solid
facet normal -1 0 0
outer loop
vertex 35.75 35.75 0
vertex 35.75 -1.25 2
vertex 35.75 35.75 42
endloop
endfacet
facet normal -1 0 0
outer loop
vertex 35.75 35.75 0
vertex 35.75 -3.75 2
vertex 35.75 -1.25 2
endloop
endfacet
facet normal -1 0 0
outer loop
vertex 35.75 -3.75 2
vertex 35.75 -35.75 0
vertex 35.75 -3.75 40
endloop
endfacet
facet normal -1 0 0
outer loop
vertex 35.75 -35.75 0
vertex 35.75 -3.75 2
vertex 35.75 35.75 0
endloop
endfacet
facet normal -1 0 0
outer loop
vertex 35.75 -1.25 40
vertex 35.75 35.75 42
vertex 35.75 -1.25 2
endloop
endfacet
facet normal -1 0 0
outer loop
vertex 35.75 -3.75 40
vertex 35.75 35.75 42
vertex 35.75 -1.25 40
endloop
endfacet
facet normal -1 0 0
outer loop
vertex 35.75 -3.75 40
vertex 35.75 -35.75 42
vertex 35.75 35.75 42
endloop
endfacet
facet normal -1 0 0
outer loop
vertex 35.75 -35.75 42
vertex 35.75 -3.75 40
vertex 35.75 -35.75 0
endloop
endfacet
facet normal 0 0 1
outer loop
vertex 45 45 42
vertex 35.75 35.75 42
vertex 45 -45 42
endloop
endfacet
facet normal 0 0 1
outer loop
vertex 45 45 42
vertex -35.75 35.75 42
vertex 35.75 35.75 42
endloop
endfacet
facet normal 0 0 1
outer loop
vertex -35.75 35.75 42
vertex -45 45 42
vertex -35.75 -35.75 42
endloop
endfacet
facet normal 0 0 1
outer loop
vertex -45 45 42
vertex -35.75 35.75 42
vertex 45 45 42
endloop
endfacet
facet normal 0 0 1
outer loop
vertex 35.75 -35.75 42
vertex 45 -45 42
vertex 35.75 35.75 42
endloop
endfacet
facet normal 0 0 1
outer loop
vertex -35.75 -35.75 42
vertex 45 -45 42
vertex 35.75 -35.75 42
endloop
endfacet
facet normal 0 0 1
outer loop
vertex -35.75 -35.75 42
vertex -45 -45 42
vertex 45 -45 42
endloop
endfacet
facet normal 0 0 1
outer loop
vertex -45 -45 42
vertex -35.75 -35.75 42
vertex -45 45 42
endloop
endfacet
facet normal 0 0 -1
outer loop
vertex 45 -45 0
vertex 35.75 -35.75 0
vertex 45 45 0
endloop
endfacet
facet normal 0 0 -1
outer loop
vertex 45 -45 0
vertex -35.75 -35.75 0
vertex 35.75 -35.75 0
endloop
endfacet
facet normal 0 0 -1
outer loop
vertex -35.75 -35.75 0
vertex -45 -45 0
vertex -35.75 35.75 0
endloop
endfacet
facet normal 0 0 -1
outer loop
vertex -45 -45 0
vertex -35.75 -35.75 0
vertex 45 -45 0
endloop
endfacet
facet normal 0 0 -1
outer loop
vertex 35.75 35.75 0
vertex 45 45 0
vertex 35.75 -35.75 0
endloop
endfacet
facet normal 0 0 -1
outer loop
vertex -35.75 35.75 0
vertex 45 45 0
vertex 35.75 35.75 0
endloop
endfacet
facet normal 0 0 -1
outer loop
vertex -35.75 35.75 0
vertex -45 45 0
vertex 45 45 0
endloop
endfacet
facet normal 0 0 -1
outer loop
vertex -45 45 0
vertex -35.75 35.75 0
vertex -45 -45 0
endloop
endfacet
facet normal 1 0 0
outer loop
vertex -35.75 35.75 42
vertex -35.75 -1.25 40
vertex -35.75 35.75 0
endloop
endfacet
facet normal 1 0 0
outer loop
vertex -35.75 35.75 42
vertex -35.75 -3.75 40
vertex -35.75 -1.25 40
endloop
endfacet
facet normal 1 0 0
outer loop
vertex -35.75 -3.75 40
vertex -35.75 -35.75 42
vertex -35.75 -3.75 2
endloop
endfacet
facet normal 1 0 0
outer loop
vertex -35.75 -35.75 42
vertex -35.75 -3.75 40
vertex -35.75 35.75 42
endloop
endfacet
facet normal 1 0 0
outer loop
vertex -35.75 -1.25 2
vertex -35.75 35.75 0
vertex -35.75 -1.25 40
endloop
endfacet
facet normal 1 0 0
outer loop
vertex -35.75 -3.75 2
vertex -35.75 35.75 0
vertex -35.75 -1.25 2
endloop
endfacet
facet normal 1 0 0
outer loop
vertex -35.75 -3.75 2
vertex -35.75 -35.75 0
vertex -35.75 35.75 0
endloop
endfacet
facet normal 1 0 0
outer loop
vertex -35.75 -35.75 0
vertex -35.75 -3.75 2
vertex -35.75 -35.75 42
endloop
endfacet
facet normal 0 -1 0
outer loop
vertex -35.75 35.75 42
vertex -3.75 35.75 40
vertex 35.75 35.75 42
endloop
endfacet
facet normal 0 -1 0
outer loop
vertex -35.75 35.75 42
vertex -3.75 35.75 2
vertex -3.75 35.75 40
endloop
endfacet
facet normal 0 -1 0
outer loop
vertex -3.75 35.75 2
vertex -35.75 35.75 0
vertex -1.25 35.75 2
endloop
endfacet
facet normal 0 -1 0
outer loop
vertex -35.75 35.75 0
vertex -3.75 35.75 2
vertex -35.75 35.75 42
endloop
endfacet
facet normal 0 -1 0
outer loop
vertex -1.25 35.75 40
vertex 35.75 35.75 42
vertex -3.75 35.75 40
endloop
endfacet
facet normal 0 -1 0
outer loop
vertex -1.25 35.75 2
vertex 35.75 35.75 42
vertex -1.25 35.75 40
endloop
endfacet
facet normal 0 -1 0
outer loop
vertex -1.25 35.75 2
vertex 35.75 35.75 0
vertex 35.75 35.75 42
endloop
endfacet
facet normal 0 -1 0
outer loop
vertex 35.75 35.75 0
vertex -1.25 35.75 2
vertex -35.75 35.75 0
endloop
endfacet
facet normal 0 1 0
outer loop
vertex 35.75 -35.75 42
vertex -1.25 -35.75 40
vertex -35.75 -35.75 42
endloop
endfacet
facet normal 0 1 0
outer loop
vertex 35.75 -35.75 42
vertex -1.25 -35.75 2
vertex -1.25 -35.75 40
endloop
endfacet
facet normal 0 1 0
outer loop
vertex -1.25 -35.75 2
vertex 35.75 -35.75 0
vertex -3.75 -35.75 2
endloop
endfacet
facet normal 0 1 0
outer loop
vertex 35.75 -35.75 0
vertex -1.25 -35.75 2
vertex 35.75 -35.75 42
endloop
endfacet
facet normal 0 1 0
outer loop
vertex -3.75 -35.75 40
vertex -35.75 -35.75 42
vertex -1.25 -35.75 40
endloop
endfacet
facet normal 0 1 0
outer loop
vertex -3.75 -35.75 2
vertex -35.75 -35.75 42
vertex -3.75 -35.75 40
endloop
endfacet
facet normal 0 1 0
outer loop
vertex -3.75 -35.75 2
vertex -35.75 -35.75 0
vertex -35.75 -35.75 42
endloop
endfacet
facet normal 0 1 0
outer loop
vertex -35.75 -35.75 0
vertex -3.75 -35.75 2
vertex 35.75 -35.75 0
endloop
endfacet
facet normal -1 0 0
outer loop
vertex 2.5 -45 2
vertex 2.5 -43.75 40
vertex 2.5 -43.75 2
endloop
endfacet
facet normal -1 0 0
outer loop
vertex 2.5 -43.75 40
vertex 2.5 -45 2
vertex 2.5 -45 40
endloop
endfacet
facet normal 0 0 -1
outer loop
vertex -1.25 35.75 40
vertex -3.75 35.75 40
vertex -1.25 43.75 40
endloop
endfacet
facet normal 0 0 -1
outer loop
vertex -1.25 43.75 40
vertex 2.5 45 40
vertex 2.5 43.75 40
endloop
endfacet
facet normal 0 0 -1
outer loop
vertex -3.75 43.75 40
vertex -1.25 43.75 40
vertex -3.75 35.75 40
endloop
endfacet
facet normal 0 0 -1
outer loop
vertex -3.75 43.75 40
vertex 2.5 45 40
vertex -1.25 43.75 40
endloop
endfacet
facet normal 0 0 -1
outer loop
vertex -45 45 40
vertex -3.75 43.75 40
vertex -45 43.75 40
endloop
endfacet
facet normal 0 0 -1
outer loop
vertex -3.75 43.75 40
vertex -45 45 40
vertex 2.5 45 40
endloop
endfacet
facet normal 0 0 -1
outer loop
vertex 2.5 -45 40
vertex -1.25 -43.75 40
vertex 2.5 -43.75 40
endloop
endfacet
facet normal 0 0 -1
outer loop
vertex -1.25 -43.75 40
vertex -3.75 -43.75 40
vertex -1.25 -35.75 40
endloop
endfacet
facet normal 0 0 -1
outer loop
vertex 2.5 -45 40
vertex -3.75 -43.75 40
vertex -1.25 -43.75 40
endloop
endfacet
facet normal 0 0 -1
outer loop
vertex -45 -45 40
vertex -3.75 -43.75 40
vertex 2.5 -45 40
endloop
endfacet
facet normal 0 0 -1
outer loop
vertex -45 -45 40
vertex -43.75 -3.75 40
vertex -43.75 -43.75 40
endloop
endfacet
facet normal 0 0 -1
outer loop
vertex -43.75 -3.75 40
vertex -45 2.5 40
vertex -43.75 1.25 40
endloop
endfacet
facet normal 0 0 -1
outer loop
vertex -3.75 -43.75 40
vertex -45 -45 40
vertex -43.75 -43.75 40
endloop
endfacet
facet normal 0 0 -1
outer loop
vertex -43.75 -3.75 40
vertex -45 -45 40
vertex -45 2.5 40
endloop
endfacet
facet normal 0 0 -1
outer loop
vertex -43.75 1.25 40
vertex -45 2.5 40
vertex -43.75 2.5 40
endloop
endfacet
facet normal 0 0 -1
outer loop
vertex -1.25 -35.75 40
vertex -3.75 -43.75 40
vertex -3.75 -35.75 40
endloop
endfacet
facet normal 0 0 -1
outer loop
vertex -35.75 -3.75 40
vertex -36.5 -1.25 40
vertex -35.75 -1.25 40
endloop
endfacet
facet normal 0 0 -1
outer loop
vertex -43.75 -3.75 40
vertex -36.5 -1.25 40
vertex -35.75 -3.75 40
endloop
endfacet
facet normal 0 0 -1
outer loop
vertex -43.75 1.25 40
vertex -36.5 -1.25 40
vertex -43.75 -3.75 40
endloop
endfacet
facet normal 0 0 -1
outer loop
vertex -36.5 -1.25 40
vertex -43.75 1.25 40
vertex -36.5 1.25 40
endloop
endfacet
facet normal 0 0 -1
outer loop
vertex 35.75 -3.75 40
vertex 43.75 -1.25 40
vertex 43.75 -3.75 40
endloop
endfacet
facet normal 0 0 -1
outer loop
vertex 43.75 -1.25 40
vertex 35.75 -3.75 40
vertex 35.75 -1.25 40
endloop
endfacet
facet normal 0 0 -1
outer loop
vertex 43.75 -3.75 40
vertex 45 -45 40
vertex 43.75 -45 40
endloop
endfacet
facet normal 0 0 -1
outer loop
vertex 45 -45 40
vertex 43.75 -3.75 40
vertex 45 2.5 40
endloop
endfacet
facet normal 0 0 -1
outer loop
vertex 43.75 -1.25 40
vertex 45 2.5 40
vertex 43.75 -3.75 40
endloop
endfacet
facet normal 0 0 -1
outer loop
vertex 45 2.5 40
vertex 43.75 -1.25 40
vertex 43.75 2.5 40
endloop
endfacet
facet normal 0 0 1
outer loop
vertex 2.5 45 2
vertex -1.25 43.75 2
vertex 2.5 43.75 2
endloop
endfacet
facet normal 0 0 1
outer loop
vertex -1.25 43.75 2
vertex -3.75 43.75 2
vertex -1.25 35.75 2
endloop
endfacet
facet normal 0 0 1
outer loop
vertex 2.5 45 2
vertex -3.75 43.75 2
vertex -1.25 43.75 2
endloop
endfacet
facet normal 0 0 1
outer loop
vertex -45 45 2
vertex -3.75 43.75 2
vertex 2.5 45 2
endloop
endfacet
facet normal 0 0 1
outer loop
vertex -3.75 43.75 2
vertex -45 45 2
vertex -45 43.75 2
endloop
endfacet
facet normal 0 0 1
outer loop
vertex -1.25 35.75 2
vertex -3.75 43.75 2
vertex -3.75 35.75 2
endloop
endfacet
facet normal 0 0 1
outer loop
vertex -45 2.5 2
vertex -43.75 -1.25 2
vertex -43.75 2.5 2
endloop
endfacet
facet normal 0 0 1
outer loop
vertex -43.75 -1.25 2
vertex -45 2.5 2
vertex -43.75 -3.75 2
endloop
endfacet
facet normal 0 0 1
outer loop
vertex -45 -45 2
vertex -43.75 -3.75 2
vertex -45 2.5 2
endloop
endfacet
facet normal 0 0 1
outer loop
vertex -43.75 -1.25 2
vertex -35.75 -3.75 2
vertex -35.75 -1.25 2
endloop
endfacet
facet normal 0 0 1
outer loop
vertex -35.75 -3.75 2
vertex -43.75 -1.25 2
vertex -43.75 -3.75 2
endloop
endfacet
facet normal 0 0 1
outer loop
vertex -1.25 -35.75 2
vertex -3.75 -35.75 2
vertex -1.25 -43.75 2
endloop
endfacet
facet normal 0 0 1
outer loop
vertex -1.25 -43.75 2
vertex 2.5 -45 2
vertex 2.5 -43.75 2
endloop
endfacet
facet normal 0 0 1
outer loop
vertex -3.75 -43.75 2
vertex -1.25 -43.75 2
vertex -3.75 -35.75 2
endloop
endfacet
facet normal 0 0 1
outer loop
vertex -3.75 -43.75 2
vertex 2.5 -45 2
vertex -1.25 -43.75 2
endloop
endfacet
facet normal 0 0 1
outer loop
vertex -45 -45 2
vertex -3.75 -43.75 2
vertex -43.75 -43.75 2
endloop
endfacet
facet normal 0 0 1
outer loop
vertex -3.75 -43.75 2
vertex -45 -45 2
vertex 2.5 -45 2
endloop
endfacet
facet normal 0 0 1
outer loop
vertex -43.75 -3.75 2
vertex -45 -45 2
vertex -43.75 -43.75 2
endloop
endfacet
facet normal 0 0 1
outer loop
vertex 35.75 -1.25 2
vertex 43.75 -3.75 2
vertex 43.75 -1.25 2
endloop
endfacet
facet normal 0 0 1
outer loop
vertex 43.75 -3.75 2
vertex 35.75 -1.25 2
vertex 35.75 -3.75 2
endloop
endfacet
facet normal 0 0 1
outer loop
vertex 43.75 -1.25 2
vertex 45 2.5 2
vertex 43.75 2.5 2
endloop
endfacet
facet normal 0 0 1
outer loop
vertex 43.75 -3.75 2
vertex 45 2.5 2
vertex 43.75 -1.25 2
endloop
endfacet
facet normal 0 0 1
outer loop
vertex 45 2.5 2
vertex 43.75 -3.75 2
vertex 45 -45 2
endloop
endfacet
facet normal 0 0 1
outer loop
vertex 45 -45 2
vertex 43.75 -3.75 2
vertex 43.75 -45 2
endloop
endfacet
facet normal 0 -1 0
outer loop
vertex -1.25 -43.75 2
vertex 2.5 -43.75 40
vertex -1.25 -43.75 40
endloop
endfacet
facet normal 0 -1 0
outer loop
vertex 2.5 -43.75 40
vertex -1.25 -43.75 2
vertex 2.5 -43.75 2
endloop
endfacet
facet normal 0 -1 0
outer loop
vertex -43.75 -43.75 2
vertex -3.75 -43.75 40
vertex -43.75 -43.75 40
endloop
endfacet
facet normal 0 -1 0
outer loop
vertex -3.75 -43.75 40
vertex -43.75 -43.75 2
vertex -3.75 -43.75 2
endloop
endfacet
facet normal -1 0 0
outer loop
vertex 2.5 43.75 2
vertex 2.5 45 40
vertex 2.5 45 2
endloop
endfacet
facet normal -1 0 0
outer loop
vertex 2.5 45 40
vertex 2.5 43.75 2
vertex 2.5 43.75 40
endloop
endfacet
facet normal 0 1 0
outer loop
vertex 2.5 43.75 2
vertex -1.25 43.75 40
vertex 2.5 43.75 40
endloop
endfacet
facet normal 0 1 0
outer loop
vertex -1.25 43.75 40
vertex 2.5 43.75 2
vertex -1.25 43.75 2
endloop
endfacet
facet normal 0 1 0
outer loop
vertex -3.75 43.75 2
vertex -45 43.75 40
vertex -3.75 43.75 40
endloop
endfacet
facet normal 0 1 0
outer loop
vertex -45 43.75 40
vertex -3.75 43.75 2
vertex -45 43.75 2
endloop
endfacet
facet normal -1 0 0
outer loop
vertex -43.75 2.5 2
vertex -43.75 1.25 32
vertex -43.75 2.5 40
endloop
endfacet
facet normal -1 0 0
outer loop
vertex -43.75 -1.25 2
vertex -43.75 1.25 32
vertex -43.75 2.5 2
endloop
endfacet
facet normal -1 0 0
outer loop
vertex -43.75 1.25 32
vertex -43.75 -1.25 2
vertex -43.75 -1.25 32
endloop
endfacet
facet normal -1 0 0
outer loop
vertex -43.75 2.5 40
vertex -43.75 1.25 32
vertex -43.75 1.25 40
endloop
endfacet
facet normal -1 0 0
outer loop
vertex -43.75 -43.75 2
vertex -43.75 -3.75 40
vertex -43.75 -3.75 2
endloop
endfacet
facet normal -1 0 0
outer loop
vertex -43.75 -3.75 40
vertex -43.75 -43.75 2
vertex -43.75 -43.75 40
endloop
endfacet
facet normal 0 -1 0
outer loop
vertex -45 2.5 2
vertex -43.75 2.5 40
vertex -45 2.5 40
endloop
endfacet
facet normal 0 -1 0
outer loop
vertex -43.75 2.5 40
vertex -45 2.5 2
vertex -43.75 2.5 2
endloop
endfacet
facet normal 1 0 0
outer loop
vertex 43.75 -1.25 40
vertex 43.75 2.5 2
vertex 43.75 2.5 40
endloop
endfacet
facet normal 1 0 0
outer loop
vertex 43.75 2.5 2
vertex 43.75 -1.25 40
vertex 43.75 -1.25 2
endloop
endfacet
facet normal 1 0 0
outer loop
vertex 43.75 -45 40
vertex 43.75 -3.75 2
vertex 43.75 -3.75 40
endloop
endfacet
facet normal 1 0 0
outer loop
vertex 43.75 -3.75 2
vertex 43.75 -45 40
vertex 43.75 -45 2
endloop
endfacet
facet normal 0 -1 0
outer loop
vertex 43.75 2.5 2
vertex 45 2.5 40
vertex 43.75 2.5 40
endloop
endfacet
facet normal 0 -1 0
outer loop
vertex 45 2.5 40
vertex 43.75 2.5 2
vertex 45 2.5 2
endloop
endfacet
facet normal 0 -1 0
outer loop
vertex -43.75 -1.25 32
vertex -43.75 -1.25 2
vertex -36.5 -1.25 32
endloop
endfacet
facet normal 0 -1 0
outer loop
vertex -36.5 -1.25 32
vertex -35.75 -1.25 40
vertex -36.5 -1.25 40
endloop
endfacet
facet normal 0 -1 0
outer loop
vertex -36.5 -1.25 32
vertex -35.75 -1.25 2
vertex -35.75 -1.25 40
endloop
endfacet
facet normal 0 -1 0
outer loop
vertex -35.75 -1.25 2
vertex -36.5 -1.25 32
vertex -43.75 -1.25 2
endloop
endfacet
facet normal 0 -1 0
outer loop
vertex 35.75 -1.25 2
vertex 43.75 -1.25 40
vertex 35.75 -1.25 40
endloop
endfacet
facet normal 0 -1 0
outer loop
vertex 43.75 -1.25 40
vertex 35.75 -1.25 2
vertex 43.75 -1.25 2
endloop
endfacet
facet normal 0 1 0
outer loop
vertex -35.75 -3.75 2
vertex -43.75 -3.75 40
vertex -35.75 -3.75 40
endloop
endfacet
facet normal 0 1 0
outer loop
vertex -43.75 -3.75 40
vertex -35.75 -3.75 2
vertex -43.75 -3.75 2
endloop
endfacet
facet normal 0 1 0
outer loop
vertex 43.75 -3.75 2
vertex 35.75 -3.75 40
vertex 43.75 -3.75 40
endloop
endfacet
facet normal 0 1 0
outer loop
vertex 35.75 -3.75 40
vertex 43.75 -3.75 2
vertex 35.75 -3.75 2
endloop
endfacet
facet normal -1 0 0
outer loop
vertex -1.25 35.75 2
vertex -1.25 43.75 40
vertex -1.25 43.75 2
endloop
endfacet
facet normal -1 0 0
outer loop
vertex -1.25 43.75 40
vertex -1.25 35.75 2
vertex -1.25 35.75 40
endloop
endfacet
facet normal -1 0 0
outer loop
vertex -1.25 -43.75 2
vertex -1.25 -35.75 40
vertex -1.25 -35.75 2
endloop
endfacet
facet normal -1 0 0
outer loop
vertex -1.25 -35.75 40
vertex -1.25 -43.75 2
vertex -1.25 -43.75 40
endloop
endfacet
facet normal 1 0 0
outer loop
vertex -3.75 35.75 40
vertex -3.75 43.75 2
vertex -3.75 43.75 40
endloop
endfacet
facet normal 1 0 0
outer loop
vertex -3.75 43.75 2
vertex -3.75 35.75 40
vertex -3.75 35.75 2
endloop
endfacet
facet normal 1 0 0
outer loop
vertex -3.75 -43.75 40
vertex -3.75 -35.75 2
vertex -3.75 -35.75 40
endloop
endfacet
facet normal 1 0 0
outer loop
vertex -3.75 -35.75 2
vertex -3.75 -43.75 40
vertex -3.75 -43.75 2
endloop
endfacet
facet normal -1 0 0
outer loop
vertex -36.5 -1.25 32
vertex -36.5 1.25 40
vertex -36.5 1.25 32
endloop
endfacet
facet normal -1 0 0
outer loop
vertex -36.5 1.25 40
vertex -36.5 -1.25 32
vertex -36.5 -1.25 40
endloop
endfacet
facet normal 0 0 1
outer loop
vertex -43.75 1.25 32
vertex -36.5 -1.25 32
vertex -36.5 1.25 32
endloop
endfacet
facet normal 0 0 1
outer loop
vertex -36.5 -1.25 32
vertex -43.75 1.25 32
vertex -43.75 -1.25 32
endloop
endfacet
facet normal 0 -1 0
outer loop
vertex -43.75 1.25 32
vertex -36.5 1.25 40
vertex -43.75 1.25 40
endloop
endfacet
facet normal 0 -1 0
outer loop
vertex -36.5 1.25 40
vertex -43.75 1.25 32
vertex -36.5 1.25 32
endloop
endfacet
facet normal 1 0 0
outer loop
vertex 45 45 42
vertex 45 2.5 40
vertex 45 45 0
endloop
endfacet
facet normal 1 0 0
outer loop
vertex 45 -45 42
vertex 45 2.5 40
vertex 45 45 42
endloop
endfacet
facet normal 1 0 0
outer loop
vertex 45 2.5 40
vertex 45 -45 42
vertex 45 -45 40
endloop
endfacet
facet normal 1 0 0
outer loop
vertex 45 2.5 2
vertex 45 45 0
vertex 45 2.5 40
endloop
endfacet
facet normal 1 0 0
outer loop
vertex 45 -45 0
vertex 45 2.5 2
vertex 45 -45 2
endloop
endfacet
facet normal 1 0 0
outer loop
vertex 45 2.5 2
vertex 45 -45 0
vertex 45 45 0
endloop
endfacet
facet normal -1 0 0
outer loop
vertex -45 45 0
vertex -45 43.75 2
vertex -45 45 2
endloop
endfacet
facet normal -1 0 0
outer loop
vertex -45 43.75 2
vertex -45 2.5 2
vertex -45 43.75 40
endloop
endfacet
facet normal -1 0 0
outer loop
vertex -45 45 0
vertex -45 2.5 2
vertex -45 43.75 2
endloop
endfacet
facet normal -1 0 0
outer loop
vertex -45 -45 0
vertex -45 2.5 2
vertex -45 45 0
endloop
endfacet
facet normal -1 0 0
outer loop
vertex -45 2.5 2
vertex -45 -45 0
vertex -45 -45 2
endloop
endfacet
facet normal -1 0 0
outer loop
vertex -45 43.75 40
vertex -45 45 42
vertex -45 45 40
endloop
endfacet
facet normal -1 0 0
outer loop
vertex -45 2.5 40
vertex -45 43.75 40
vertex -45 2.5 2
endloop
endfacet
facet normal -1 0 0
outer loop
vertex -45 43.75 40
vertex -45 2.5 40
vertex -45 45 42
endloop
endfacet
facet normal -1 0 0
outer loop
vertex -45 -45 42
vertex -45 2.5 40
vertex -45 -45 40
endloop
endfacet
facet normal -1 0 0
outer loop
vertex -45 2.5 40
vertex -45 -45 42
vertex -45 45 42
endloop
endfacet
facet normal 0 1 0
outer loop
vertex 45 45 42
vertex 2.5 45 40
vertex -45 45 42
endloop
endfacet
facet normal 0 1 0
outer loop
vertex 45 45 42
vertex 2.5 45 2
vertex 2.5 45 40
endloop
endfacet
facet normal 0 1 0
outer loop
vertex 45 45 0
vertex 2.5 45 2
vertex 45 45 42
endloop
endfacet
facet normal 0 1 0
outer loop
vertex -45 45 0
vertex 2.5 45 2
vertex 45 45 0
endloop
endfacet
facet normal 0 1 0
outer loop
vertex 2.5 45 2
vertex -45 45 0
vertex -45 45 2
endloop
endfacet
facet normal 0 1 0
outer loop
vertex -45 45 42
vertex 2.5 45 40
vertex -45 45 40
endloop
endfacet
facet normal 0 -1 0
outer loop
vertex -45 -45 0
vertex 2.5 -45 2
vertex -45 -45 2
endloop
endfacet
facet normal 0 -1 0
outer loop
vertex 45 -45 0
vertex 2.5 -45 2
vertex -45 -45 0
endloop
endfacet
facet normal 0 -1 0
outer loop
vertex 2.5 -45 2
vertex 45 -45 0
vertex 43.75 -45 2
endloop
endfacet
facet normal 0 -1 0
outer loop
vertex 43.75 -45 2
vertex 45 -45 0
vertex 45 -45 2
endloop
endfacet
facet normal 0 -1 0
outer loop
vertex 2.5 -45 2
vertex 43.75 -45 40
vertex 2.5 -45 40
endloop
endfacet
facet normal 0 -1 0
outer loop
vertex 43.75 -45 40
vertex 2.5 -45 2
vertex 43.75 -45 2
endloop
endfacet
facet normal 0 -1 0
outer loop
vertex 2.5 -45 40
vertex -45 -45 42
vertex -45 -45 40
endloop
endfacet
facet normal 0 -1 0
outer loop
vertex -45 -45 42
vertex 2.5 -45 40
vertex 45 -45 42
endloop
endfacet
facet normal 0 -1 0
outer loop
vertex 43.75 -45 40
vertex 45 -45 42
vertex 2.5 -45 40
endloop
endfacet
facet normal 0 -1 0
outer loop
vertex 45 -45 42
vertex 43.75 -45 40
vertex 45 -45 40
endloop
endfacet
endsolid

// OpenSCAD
// Built by bench/smallmodels/features/compiler.py from a list of features.
$fn = 64;
difference() {
  union() {
    translate([0, 0, 0]) translate([-45, -45, 0]) cube([90, 90, 42]);
  }
  union() {
    translate([0, 0, 0]) rotate([0, 0, 0]) translate([-35.75, -35.75, 0]) cube([71.5, 71.5, 42]);
    translate([-42.5, -135, 2]) rotate([0, 0, 0]) translate([-45, -1.25, 0]) cube([90, 2.5, 38]);
    translate([-42.5, -45, 2]) rotate([0, 0, 0]) translate([-45, -1.25, 0]) cube([90, 2.5, 38]);
    translate([-42.5, 45, 2]) rotate([0, 0, 0]) translate([-45, -1.25, 0]) cube([90, 2.5, 38]);
    translate([-42.5, 135, 2]) rotate([0, 0, 0]) translate([-45, -1.25, 0]) cube([90, 2.5, 38]);
    translate([-135, -42.5, 2]) rotate([0, 0, 0]) translate([-1.25, -45, 0]) cube([2.5, 90, 38]);
    translate([-45, -42.5, 2]) rotate([0, 0, 0]) translate([-1.25, -45, 0]) cube([2.5, 90, 38]);
    translate([45, -42.5, 2]) rotate([0, 0, 0]) translate([-1.25, -45, 0]) cube([2.5, 90, 38]);
    translate([135, -42.5, 2]) rotate([0, 0, 0]) translate([-1.25, -45, 0]) cube([2.5, 90, 38]);
    translate([0, -92.5, 2]) rotate([0, 0, 0]) translate([-45, -1.25, 0]) cube([90, 2.5, 38]);
    translate([0, -2.5, 2]) rotate([0, 0, 0]) translate([-45, -1.25, 0]) cube([90, 2.5, 38]);
    translate([0, 87.5, 2]) rotate([0, 0, 0]) translate([-45, -1.25, 0]) cube([90, 2.5, 38]);
    translate([0, 177.5, 2]) rotate([0, 0, 0]) translate([-45, -1.25, 0]) cube([90, 2.5, 38]);
    translate([-92.5, 0, 2]) rotate([0, 0, 0]) translate([-1.25, -45, 0]) cube([2.5, 90, 38]);
    translate([-2.5, 0, 2]) rotate([0, 0, 0]) translate([-1.25, -45, 0]) cube([2.5, 90, 38]);
    translate([87.5, 0, 2]) rotate([0, 0, 0]) translate([-1.25, -45, 0]) cube([2.5, 90, 38]);
    translate([177.5, 0, 2]) rotate([0, 0, 0]) translate([-1.25, -45, 0]) cube([2.5, 90, 38]);
    translate([-42.5, 0, 32]) rotate([0, 0, 0]) translate([-6, -1.25, 0]) cube([12, 2.5, 8]);
  }
}
